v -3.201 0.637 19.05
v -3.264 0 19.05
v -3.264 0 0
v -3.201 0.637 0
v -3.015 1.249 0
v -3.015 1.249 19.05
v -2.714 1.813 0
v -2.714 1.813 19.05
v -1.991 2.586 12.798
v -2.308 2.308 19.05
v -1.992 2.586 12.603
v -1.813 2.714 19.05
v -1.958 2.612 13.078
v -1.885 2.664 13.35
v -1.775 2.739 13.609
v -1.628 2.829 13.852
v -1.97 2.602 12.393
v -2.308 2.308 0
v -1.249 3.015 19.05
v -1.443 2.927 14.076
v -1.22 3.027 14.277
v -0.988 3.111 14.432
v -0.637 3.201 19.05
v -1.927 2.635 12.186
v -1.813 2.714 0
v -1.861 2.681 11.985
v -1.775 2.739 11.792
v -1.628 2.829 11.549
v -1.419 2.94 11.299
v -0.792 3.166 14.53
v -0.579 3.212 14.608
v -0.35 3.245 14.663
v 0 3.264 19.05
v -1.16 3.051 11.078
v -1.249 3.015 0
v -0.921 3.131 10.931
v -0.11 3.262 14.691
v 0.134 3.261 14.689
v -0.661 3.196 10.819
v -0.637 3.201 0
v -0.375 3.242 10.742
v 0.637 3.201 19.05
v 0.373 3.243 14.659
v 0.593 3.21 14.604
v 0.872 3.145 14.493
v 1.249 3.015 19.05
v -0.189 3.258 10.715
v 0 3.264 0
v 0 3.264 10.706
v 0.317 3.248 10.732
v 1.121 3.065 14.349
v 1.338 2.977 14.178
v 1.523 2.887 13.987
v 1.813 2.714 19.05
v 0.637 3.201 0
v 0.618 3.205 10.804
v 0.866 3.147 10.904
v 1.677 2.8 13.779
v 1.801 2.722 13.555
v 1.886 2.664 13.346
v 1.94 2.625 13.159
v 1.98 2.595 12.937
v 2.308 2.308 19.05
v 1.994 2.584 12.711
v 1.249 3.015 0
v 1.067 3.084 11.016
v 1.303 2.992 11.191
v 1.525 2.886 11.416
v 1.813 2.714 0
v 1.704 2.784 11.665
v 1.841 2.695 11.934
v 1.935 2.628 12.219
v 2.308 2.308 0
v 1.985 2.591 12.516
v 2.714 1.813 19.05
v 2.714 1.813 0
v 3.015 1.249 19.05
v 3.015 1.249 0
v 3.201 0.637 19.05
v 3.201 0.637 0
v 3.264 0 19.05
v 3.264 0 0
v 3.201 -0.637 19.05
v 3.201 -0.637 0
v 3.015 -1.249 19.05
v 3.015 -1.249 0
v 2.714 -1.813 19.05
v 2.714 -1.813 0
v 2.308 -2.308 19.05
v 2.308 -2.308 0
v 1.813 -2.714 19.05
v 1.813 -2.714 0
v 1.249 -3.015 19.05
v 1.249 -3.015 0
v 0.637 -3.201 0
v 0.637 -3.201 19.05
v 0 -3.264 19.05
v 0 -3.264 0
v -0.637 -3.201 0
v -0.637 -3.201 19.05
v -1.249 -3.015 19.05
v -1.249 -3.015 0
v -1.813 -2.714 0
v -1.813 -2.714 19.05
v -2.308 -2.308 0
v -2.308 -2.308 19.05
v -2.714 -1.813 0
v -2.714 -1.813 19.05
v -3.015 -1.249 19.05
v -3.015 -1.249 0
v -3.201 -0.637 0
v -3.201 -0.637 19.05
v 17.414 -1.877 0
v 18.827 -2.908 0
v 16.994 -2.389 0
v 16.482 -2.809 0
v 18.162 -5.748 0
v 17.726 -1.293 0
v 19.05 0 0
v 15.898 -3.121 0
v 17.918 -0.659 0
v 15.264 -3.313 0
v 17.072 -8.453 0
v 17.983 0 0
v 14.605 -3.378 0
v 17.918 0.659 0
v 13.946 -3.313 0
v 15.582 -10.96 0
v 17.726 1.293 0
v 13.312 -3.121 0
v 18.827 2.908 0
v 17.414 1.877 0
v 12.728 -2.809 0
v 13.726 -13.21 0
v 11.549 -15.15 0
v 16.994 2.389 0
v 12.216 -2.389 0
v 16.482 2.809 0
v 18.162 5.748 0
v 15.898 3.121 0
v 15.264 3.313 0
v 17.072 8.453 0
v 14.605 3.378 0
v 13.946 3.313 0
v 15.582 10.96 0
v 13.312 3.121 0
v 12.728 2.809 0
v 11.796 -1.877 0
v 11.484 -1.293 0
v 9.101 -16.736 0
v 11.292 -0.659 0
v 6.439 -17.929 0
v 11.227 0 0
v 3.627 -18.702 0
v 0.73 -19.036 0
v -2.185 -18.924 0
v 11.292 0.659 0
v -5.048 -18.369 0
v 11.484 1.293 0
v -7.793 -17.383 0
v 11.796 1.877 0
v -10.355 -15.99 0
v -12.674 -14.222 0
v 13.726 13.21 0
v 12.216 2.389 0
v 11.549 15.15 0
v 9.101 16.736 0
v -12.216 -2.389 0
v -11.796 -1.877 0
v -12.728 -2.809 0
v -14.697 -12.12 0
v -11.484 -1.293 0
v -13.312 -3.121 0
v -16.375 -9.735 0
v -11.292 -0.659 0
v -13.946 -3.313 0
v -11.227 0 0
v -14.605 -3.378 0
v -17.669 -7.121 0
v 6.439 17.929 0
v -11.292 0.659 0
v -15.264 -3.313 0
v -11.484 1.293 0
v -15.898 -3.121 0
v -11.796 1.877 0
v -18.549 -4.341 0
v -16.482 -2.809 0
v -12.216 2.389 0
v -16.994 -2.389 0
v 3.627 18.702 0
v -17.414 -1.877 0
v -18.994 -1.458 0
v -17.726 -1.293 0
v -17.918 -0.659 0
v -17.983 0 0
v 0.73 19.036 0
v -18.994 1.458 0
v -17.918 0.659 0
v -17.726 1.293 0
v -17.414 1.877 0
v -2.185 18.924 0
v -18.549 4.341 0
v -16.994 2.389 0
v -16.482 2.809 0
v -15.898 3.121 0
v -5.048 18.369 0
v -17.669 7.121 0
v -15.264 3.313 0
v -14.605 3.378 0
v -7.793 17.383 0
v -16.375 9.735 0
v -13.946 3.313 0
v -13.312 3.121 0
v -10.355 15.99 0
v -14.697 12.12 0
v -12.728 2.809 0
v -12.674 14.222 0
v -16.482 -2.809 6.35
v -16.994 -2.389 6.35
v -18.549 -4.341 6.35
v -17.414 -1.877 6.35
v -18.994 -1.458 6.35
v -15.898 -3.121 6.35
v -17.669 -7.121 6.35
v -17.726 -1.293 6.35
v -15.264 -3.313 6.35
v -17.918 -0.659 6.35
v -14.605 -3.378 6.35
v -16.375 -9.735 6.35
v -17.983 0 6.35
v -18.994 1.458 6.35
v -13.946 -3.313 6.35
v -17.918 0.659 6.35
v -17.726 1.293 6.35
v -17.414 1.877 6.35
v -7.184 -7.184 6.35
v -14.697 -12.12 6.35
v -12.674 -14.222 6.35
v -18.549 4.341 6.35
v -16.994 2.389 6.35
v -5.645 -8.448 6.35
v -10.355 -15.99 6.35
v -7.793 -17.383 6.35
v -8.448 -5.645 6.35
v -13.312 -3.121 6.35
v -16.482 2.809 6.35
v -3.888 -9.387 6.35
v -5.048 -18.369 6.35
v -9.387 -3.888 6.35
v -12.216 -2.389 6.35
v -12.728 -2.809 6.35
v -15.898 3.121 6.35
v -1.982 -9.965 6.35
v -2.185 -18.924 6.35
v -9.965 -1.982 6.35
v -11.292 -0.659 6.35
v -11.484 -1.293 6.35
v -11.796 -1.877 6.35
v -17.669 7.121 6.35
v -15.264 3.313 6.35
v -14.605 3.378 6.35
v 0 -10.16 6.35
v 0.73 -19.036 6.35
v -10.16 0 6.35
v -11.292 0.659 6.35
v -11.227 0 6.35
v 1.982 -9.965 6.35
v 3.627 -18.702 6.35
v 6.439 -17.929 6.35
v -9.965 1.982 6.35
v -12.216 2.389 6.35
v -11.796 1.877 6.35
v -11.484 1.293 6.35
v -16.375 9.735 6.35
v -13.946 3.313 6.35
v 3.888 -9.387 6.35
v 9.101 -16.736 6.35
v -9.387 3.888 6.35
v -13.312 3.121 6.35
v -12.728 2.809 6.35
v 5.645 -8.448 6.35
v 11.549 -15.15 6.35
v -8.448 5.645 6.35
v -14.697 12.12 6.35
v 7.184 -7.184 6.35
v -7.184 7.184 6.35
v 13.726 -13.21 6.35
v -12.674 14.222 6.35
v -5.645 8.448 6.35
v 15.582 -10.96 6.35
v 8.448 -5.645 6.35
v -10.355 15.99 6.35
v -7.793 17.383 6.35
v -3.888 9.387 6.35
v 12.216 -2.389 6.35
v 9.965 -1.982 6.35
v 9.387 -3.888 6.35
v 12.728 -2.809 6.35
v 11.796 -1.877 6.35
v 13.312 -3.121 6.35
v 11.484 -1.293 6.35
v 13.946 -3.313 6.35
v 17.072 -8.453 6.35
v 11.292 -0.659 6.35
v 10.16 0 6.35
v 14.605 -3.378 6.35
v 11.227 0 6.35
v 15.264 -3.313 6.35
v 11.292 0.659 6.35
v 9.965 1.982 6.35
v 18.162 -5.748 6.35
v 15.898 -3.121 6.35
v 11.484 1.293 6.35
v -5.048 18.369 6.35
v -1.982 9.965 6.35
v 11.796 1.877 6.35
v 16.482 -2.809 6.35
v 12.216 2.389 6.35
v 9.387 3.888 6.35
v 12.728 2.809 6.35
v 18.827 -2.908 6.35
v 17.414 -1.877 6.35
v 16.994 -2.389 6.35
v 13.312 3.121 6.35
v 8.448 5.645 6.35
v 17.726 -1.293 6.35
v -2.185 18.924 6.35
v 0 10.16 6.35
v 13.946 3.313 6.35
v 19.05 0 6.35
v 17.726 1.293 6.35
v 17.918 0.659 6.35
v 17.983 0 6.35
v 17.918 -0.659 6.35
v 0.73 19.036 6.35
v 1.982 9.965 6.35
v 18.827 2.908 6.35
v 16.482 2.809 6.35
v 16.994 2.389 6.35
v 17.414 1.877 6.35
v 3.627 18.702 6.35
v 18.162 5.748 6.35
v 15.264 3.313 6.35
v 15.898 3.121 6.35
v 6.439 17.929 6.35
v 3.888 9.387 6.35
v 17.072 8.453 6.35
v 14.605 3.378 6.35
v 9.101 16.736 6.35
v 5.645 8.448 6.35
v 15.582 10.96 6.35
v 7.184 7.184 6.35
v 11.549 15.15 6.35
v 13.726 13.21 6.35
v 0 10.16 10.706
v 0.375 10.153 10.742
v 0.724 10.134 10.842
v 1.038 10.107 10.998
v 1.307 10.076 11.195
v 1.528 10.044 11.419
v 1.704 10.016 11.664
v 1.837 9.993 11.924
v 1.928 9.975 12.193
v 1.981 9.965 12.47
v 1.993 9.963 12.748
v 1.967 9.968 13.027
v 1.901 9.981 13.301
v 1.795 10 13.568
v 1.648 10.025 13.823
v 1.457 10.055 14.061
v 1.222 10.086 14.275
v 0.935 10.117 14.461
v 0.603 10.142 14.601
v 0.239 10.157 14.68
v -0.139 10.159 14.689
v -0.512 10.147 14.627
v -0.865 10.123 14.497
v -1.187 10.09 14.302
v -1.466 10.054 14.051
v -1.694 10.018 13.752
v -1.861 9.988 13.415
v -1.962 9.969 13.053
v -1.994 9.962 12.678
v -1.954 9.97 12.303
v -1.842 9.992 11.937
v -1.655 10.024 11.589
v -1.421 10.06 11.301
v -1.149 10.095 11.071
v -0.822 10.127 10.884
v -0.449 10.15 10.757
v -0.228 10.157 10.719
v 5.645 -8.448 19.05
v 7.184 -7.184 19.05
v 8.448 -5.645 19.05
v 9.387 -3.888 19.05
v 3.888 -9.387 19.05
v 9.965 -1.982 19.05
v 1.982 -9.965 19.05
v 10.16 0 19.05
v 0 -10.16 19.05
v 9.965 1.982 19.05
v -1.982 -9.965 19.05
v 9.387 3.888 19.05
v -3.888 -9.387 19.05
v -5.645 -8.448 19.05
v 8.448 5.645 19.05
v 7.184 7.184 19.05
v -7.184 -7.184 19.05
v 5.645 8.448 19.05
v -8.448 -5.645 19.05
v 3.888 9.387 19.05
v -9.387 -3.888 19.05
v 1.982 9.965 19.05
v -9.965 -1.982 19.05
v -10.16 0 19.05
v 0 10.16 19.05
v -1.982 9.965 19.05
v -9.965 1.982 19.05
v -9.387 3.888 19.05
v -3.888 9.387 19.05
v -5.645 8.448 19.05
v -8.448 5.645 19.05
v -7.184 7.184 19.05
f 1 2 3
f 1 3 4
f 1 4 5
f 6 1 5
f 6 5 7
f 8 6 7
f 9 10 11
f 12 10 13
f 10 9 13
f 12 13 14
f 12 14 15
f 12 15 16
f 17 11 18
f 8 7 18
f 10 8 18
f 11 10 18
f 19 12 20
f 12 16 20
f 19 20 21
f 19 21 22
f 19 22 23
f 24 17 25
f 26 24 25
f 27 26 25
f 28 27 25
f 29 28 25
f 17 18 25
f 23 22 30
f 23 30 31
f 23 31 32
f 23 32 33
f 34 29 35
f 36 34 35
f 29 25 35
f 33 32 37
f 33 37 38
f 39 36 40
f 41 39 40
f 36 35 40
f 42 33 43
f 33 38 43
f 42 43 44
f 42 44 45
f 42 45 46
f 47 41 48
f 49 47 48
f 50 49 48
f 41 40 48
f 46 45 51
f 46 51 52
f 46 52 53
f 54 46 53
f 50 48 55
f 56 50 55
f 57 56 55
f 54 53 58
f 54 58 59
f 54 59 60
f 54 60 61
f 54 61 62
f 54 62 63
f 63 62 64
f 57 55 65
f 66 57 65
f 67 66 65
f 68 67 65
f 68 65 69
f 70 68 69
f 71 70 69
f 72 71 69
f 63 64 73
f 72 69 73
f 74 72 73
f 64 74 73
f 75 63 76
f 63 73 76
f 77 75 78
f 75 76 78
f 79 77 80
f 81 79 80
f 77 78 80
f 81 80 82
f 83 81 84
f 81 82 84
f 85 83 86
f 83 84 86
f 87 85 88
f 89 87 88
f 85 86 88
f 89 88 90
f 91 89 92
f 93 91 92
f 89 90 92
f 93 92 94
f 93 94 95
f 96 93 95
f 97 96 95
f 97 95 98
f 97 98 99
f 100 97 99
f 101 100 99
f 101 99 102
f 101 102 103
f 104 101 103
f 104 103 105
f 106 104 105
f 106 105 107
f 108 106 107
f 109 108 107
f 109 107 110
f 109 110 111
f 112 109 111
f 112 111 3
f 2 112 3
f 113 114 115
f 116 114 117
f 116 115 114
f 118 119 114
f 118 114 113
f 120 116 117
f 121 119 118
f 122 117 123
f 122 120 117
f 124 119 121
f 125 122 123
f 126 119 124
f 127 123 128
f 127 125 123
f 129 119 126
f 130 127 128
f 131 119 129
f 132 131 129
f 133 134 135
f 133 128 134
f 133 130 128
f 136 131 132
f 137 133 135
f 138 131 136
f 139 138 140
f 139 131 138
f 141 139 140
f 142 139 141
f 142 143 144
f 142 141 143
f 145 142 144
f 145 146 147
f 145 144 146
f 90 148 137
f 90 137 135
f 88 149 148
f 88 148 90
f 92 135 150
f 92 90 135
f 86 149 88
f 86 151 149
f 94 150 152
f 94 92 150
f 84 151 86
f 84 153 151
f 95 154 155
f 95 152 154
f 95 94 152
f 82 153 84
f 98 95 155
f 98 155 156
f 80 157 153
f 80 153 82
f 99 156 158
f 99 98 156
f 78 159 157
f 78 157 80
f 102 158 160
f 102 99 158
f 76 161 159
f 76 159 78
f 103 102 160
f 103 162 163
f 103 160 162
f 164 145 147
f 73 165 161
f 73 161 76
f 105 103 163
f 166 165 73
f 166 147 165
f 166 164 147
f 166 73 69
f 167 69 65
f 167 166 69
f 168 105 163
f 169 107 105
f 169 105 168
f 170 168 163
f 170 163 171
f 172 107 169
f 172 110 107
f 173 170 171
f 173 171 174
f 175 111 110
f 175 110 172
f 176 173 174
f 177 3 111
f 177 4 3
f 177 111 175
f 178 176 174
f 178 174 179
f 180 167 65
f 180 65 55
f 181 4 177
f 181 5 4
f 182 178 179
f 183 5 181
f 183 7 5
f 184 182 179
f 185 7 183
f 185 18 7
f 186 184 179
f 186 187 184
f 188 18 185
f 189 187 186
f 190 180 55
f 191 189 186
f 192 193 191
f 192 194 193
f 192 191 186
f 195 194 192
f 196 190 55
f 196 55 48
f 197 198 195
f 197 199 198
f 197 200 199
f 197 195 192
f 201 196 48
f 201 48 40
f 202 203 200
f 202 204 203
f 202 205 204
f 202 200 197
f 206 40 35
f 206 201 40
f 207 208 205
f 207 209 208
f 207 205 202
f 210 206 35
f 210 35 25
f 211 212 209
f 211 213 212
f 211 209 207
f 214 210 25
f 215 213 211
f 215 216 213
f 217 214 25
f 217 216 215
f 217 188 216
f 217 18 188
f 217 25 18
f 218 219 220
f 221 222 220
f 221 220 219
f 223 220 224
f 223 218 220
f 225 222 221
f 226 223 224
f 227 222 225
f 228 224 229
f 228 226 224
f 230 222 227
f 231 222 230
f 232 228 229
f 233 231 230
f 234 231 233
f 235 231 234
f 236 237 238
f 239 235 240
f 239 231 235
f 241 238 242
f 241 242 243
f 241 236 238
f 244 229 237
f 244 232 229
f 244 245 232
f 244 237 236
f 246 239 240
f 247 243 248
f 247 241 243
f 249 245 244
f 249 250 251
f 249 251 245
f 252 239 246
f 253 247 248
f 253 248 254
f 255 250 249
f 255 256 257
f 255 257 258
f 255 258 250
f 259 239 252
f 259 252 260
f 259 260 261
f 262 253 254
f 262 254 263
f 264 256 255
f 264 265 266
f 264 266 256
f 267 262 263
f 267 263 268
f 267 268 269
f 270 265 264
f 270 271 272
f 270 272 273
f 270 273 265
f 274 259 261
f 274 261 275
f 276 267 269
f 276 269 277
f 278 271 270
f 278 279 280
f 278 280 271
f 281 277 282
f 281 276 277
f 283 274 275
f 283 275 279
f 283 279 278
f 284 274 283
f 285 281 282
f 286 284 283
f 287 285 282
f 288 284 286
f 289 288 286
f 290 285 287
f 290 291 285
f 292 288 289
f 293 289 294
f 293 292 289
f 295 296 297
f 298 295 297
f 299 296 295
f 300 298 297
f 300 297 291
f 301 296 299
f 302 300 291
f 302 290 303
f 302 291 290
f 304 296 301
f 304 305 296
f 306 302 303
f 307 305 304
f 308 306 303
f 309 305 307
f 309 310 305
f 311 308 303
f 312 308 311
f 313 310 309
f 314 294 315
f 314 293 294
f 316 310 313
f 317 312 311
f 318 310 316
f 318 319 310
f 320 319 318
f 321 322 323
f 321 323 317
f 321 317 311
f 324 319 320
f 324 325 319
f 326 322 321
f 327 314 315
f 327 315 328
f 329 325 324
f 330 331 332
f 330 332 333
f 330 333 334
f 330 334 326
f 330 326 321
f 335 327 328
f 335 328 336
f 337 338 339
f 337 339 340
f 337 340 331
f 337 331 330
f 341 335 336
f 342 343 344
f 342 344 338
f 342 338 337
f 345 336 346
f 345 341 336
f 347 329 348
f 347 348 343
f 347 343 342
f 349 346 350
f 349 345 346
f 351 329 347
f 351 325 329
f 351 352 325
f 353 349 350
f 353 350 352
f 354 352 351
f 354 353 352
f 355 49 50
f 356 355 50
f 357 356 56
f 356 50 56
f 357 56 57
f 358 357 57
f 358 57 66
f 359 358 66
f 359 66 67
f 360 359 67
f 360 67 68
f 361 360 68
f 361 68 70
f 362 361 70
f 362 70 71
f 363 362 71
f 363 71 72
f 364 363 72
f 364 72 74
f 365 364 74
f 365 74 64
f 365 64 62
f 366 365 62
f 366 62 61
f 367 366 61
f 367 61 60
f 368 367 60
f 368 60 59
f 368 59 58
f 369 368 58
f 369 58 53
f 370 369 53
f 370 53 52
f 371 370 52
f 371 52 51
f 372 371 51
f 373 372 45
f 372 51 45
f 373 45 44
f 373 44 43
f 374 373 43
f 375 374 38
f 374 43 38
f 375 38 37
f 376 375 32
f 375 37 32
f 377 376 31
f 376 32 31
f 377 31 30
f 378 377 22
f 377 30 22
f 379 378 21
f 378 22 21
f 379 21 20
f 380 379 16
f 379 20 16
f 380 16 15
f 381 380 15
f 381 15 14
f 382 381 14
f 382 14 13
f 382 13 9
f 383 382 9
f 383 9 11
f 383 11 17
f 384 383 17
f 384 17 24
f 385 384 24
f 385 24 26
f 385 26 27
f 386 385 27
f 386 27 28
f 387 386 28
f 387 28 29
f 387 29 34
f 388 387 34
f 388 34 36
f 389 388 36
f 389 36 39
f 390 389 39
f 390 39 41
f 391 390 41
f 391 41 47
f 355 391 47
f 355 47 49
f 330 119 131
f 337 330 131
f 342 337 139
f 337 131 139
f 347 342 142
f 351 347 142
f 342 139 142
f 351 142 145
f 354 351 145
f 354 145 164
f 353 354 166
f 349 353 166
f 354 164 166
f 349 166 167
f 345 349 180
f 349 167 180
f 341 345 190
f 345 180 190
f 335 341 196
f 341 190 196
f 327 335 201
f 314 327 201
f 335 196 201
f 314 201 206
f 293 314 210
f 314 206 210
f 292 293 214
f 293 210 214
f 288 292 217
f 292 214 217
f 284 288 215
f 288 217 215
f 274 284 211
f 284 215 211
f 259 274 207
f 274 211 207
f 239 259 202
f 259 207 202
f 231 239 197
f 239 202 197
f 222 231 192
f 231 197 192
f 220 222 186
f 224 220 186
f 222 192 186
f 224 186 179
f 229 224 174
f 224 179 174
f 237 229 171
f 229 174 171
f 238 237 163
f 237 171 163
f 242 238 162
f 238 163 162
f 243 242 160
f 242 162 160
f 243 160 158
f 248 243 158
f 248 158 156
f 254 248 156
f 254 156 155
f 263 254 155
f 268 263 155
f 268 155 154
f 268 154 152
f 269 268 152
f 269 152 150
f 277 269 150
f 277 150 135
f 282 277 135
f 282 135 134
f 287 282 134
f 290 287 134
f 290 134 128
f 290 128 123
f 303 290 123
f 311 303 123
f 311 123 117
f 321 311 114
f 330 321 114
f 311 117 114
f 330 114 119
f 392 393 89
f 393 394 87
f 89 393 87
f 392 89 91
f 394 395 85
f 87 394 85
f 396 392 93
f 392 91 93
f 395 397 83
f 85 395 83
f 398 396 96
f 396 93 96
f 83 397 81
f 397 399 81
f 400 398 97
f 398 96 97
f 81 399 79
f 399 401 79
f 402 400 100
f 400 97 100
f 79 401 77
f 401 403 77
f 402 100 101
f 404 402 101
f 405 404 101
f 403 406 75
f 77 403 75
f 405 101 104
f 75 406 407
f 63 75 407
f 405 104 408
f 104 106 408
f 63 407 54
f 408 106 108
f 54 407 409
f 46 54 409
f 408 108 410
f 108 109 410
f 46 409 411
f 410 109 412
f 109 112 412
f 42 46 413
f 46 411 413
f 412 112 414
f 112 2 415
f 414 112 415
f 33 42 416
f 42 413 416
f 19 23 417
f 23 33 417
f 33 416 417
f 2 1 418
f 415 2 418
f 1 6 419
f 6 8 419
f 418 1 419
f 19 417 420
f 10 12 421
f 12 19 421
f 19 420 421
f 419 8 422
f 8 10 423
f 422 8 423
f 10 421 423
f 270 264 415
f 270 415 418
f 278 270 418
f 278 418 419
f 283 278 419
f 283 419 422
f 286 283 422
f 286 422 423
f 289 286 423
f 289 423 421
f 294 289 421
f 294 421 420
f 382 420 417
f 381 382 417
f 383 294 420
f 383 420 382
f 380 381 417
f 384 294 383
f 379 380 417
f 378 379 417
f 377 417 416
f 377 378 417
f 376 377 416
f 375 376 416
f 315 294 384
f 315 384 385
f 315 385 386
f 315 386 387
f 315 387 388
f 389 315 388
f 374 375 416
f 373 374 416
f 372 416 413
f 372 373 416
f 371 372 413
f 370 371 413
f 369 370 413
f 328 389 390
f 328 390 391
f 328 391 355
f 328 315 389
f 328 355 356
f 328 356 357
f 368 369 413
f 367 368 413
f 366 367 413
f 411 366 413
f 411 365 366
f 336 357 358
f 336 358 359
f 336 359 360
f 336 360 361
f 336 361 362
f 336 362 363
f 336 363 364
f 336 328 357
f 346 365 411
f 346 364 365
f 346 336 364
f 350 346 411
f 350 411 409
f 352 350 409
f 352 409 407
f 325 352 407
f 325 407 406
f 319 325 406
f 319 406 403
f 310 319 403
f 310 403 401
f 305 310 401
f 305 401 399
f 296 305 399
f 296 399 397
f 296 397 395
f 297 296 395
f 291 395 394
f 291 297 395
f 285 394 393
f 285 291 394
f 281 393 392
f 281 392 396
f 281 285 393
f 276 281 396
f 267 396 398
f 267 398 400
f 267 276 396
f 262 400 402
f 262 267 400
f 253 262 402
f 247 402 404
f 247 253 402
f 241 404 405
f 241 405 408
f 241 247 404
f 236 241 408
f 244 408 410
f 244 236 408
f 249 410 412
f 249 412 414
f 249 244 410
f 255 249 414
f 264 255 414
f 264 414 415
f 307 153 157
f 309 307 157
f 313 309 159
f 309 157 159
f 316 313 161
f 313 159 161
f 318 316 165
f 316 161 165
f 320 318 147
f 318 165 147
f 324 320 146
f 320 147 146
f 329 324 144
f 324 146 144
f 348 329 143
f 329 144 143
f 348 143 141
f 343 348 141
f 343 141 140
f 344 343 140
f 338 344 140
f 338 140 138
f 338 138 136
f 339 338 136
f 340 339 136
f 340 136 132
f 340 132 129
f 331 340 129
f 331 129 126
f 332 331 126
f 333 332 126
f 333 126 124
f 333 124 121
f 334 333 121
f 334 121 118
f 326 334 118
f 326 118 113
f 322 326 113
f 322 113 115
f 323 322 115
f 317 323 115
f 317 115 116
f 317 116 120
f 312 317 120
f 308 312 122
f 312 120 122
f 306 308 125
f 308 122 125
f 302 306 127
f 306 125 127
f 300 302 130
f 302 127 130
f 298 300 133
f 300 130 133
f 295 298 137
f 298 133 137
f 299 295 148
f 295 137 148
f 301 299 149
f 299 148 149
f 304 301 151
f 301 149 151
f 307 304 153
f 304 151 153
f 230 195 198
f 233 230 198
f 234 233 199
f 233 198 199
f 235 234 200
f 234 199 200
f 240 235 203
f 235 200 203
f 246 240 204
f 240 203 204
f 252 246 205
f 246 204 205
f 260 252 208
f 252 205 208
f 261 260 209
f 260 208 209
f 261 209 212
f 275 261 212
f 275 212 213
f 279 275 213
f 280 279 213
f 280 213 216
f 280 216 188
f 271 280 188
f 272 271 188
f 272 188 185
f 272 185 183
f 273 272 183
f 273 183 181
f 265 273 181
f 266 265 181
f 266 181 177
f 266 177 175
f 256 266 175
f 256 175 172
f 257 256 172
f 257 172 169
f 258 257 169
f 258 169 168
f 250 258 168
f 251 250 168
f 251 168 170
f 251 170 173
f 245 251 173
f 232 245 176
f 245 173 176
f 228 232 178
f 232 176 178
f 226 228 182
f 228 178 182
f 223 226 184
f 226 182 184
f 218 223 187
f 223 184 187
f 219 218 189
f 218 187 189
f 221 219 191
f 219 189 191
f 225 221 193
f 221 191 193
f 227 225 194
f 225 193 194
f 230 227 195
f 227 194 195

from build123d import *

# Parameters (mm, degrees)
SKETCH1_R                  = 19.05
BOSS_EXTRUDE1_DEPTH        = 6.35
SKETCH2_R                  = 10.16
BOSS_EXTRUDE2_DEPTH        = 19.05
F_0_257_DIAMETER_HOLE1_D   = 6.5278
F_10_24_TAPPED_HOLE3_D     = 3.9878
F_10_24_TAPPED_HOLE3_DEPTH = 10.159
F_10_24_TAPPED_HOLE3_TIP   = 1.198055988
H_0_266_DIAMETER_HOLE1_D   = 6.7564


with BuildPart() as part:
    # Sketch1 → Boss-Extrude1 (new body)
    with BuildSketch(Plane.XY):
        Circle(SKETCH1_R)
    extrude(amount=BOSS_EXTRUDE1_DEPTH)

    # Sketch2 → Boss-Extrude2 (add)
    with BuildSketch(Plane(origin=(0, 0, 0), x_dir=(-1, 0, 0), z_dir=(0, 0, -1))):
        Circle(SKETCH2_R)
    extrude(amount=-BOSS_EXTRUDE2_DEPTH)

    # F (0.257) Diameter Hole1 (through all)
    with Locations(Plane.XY.offset(19.05)):
        with Locations((0, 0)):
            Hole(F_0_257_DIAMETER_HOLE1_D / 2)

    # #10-24 Tapped Hole3
    with Locations(Plane(origin=(0, 10.16, 12.7), x_dir=(0, 0, 1), z_dir=(0, 1, 0))):
        with Locations((0, 0)):
            Hole(F_10_24_TAPPED_HOLE3_D / 2, depth=F_10_24_TAPPED_HOLE3_DEPTH)
            with Locations((0, 0, -(F_10_24_TAPPED_HOLE3_DEPTH + F_10_24_TAPPED_HOLE3_TIP / 2))):  # 118° drill point
                Cone(0, F_10_24_TAPPED_HOLE3_D / 2, F_10_24_TAPPED_HOLE3_TIP, mode=Mode.SUBTRACT)

    # H (0.266) Diameter Hole1 (through all)
    with Locations(Plane.XY.offset(6.35)):
        with Locations((-14.605, 0), (14.605, 0)):
            Hole(H_0_266_DIAMETER_HOLE1_D / 2)


solid = part.part
